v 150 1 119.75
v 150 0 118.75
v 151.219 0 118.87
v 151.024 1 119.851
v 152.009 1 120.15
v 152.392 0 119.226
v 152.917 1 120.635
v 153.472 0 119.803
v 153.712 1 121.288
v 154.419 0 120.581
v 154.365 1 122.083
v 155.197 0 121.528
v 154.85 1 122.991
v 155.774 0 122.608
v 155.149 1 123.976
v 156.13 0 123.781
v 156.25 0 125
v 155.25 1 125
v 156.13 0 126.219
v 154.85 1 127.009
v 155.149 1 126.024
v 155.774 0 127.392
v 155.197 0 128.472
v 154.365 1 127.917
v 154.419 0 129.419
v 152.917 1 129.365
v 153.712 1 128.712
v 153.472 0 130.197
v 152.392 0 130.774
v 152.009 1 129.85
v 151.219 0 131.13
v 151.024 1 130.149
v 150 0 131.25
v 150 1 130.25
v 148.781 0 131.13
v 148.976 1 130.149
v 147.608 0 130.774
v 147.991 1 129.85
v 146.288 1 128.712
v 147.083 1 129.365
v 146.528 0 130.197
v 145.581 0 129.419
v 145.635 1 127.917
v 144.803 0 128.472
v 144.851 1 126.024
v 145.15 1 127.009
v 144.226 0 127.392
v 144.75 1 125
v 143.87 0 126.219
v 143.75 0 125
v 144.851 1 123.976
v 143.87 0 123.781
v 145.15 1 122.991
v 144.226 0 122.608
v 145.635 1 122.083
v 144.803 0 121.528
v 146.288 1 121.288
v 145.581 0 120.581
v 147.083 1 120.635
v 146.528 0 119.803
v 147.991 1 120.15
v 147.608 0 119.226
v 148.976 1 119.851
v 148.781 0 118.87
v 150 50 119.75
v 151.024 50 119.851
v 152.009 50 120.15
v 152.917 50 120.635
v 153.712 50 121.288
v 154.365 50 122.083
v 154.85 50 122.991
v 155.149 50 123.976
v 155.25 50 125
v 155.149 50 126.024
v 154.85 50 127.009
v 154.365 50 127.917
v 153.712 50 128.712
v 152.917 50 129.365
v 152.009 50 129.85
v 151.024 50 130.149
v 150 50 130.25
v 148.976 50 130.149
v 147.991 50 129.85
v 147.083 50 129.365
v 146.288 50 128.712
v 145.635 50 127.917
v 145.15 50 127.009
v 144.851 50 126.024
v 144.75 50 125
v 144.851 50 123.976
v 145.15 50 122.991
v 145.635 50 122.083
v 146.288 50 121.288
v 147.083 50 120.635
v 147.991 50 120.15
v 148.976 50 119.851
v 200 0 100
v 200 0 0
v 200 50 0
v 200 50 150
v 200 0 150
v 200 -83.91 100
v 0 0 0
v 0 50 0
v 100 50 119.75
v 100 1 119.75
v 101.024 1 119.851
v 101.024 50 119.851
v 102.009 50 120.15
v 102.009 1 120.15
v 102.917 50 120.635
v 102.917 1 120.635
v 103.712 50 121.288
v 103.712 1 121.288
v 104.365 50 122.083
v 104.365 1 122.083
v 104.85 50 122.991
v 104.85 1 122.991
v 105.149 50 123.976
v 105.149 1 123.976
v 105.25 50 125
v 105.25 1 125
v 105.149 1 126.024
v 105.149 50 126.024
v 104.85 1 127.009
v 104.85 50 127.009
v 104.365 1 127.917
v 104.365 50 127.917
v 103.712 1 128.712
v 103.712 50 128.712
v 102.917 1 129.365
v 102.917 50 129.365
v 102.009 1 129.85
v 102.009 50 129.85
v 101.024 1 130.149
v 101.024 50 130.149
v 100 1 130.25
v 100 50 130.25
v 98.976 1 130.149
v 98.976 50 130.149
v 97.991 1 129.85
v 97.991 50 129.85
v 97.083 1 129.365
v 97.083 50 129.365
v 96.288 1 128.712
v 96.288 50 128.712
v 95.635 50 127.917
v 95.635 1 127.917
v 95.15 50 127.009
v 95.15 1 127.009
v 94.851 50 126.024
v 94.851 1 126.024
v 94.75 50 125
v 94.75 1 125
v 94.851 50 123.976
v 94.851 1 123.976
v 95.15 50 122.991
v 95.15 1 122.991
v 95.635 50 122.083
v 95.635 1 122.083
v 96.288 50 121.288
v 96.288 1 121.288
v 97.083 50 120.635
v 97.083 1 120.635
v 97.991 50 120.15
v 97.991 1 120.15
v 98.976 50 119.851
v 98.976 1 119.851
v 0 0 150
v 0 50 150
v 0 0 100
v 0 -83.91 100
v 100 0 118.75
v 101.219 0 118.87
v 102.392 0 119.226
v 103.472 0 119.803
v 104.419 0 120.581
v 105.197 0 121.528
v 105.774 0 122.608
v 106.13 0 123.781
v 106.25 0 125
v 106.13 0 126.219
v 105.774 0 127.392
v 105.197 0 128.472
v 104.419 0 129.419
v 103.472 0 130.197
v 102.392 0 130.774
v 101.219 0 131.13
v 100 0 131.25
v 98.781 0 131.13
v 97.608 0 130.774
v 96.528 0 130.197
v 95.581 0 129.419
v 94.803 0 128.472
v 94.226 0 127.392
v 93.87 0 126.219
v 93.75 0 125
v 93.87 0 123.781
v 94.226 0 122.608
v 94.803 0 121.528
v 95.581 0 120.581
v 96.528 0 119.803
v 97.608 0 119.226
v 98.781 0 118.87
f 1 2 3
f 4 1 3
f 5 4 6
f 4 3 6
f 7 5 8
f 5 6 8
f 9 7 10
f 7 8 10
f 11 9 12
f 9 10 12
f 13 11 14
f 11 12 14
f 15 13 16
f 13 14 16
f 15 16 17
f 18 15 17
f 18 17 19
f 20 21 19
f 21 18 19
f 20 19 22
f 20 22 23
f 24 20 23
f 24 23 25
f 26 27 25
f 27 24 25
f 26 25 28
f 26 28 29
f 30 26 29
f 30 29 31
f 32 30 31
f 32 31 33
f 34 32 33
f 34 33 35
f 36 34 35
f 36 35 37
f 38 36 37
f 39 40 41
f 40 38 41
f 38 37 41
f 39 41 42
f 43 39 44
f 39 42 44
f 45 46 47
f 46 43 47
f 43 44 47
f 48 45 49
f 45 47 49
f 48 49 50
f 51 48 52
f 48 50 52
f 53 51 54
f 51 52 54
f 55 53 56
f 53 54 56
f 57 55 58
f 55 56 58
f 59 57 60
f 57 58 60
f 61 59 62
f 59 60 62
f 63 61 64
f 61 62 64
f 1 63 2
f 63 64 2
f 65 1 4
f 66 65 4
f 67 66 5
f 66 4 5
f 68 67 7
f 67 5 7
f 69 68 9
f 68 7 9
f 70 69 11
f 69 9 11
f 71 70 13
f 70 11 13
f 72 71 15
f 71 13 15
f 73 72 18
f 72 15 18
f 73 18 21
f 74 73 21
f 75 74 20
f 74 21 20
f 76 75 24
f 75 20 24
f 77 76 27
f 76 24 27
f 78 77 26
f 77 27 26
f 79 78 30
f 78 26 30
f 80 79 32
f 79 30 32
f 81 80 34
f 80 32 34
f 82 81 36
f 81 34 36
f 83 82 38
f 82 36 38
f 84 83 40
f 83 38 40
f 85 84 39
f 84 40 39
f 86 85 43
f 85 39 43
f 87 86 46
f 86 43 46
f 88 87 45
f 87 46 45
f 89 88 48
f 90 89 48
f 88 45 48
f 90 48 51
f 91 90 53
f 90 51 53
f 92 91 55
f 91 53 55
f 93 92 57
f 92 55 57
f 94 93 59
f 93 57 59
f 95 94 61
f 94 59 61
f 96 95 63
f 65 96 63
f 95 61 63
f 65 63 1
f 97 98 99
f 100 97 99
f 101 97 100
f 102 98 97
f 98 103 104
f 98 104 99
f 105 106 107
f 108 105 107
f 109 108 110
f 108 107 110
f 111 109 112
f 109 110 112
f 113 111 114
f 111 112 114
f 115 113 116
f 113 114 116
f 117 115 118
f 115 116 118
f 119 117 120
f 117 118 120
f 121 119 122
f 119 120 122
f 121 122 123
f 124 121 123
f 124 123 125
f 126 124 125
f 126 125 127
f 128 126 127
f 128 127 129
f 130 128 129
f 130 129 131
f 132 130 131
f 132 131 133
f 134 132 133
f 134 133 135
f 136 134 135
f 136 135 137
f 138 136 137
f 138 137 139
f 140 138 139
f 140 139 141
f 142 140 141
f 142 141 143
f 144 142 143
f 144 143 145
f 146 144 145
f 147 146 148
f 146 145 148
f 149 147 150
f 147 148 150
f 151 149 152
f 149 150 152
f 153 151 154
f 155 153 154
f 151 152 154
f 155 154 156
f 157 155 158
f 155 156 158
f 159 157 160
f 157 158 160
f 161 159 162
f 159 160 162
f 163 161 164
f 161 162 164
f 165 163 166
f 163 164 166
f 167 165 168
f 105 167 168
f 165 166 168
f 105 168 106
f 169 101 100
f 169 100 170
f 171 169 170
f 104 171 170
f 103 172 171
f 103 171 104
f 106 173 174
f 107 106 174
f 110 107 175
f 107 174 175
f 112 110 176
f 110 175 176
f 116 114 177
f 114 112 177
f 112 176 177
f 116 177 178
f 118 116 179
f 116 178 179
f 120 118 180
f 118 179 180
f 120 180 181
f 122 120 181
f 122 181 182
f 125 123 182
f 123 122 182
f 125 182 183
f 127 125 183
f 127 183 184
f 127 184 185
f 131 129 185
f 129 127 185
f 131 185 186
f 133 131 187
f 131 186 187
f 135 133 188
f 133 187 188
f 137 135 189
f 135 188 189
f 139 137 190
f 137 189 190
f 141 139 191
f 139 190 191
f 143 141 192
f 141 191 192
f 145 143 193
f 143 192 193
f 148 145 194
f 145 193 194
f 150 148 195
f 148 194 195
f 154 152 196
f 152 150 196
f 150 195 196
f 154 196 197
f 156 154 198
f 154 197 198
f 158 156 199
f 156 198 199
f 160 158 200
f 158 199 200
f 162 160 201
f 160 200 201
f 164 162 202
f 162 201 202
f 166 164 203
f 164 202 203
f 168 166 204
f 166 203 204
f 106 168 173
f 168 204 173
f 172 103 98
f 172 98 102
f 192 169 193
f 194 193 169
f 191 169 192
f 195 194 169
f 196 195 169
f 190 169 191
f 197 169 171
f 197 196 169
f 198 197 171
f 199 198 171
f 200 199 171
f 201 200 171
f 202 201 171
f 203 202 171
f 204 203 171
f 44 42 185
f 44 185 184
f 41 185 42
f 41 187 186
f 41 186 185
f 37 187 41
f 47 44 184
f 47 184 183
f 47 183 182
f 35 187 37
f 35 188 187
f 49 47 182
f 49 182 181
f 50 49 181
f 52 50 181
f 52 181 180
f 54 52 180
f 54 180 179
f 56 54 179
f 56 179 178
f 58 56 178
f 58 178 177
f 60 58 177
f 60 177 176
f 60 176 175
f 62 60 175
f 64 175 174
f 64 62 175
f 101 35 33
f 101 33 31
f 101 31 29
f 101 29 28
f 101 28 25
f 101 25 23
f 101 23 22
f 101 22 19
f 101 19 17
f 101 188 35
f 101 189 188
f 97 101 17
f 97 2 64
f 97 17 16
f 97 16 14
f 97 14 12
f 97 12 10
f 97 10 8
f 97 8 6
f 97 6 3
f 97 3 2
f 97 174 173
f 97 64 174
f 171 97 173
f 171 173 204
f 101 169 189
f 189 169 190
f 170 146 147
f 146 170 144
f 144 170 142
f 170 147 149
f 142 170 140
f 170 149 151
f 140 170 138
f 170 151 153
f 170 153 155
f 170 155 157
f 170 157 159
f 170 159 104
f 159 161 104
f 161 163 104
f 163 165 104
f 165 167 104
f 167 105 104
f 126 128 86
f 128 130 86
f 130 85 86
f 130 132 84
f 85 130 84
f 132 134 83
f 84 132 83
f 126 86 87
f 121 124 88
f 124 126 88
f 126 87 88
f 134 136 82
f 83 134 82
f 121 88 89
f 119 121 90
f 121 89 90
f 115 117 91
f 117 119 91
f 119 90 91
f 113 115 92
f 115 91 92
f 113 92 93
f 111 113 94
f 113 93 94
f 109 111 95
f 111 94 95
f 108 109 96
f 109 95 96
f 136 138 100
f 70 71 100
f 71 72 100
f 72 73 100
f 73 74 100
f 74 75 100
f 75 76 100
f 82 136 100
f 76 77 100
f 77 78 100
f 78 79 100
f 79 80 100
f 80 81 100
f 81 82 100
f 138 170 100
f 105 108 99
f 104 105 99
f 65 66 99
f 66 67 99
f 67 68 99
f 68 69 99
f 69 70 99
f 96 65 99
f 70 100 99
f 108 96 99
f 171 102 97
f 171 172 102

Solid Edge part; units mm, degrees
sketch "Sketch1" plane through (0, 0, 0) normal (0, -1, 0) x (1, 0, 0)
  line L0 (0, 0) -> (200, 0)
  line L1 (200, 0) -> (200, 150)
  line L2 (200, 150) -> (0, 150)
  line L3 (0, 150) -> (0, 0)
extrude "Protrusion1" add sketch "Sketch1" against normal blind 50
sketch "Sketch2" plane through (0, 25, 75) normal (-1, 0, 0) x (0, 0, -1)
  line L0 (75, 25) -> (-25, 108.91)
  line L1 (-25, 108.91) -> (-25, 25)
  line L2 (-25, 25) -> (75, 25)
extrude "Extrusionsausprägung_2" add sketch "Sketch2" against normal blind 200
hole "Bohrung_1" at (100, 0, 125) direction (0, 1, 0) diameter 10.5 end up to next start chamfer 1 start chamfer angle 45
hole "Hole1" at (150, 0, 125) direction (0, 1, 0) diameter 10.5 end up to next start chamfer 1 start chamfer angle 45
